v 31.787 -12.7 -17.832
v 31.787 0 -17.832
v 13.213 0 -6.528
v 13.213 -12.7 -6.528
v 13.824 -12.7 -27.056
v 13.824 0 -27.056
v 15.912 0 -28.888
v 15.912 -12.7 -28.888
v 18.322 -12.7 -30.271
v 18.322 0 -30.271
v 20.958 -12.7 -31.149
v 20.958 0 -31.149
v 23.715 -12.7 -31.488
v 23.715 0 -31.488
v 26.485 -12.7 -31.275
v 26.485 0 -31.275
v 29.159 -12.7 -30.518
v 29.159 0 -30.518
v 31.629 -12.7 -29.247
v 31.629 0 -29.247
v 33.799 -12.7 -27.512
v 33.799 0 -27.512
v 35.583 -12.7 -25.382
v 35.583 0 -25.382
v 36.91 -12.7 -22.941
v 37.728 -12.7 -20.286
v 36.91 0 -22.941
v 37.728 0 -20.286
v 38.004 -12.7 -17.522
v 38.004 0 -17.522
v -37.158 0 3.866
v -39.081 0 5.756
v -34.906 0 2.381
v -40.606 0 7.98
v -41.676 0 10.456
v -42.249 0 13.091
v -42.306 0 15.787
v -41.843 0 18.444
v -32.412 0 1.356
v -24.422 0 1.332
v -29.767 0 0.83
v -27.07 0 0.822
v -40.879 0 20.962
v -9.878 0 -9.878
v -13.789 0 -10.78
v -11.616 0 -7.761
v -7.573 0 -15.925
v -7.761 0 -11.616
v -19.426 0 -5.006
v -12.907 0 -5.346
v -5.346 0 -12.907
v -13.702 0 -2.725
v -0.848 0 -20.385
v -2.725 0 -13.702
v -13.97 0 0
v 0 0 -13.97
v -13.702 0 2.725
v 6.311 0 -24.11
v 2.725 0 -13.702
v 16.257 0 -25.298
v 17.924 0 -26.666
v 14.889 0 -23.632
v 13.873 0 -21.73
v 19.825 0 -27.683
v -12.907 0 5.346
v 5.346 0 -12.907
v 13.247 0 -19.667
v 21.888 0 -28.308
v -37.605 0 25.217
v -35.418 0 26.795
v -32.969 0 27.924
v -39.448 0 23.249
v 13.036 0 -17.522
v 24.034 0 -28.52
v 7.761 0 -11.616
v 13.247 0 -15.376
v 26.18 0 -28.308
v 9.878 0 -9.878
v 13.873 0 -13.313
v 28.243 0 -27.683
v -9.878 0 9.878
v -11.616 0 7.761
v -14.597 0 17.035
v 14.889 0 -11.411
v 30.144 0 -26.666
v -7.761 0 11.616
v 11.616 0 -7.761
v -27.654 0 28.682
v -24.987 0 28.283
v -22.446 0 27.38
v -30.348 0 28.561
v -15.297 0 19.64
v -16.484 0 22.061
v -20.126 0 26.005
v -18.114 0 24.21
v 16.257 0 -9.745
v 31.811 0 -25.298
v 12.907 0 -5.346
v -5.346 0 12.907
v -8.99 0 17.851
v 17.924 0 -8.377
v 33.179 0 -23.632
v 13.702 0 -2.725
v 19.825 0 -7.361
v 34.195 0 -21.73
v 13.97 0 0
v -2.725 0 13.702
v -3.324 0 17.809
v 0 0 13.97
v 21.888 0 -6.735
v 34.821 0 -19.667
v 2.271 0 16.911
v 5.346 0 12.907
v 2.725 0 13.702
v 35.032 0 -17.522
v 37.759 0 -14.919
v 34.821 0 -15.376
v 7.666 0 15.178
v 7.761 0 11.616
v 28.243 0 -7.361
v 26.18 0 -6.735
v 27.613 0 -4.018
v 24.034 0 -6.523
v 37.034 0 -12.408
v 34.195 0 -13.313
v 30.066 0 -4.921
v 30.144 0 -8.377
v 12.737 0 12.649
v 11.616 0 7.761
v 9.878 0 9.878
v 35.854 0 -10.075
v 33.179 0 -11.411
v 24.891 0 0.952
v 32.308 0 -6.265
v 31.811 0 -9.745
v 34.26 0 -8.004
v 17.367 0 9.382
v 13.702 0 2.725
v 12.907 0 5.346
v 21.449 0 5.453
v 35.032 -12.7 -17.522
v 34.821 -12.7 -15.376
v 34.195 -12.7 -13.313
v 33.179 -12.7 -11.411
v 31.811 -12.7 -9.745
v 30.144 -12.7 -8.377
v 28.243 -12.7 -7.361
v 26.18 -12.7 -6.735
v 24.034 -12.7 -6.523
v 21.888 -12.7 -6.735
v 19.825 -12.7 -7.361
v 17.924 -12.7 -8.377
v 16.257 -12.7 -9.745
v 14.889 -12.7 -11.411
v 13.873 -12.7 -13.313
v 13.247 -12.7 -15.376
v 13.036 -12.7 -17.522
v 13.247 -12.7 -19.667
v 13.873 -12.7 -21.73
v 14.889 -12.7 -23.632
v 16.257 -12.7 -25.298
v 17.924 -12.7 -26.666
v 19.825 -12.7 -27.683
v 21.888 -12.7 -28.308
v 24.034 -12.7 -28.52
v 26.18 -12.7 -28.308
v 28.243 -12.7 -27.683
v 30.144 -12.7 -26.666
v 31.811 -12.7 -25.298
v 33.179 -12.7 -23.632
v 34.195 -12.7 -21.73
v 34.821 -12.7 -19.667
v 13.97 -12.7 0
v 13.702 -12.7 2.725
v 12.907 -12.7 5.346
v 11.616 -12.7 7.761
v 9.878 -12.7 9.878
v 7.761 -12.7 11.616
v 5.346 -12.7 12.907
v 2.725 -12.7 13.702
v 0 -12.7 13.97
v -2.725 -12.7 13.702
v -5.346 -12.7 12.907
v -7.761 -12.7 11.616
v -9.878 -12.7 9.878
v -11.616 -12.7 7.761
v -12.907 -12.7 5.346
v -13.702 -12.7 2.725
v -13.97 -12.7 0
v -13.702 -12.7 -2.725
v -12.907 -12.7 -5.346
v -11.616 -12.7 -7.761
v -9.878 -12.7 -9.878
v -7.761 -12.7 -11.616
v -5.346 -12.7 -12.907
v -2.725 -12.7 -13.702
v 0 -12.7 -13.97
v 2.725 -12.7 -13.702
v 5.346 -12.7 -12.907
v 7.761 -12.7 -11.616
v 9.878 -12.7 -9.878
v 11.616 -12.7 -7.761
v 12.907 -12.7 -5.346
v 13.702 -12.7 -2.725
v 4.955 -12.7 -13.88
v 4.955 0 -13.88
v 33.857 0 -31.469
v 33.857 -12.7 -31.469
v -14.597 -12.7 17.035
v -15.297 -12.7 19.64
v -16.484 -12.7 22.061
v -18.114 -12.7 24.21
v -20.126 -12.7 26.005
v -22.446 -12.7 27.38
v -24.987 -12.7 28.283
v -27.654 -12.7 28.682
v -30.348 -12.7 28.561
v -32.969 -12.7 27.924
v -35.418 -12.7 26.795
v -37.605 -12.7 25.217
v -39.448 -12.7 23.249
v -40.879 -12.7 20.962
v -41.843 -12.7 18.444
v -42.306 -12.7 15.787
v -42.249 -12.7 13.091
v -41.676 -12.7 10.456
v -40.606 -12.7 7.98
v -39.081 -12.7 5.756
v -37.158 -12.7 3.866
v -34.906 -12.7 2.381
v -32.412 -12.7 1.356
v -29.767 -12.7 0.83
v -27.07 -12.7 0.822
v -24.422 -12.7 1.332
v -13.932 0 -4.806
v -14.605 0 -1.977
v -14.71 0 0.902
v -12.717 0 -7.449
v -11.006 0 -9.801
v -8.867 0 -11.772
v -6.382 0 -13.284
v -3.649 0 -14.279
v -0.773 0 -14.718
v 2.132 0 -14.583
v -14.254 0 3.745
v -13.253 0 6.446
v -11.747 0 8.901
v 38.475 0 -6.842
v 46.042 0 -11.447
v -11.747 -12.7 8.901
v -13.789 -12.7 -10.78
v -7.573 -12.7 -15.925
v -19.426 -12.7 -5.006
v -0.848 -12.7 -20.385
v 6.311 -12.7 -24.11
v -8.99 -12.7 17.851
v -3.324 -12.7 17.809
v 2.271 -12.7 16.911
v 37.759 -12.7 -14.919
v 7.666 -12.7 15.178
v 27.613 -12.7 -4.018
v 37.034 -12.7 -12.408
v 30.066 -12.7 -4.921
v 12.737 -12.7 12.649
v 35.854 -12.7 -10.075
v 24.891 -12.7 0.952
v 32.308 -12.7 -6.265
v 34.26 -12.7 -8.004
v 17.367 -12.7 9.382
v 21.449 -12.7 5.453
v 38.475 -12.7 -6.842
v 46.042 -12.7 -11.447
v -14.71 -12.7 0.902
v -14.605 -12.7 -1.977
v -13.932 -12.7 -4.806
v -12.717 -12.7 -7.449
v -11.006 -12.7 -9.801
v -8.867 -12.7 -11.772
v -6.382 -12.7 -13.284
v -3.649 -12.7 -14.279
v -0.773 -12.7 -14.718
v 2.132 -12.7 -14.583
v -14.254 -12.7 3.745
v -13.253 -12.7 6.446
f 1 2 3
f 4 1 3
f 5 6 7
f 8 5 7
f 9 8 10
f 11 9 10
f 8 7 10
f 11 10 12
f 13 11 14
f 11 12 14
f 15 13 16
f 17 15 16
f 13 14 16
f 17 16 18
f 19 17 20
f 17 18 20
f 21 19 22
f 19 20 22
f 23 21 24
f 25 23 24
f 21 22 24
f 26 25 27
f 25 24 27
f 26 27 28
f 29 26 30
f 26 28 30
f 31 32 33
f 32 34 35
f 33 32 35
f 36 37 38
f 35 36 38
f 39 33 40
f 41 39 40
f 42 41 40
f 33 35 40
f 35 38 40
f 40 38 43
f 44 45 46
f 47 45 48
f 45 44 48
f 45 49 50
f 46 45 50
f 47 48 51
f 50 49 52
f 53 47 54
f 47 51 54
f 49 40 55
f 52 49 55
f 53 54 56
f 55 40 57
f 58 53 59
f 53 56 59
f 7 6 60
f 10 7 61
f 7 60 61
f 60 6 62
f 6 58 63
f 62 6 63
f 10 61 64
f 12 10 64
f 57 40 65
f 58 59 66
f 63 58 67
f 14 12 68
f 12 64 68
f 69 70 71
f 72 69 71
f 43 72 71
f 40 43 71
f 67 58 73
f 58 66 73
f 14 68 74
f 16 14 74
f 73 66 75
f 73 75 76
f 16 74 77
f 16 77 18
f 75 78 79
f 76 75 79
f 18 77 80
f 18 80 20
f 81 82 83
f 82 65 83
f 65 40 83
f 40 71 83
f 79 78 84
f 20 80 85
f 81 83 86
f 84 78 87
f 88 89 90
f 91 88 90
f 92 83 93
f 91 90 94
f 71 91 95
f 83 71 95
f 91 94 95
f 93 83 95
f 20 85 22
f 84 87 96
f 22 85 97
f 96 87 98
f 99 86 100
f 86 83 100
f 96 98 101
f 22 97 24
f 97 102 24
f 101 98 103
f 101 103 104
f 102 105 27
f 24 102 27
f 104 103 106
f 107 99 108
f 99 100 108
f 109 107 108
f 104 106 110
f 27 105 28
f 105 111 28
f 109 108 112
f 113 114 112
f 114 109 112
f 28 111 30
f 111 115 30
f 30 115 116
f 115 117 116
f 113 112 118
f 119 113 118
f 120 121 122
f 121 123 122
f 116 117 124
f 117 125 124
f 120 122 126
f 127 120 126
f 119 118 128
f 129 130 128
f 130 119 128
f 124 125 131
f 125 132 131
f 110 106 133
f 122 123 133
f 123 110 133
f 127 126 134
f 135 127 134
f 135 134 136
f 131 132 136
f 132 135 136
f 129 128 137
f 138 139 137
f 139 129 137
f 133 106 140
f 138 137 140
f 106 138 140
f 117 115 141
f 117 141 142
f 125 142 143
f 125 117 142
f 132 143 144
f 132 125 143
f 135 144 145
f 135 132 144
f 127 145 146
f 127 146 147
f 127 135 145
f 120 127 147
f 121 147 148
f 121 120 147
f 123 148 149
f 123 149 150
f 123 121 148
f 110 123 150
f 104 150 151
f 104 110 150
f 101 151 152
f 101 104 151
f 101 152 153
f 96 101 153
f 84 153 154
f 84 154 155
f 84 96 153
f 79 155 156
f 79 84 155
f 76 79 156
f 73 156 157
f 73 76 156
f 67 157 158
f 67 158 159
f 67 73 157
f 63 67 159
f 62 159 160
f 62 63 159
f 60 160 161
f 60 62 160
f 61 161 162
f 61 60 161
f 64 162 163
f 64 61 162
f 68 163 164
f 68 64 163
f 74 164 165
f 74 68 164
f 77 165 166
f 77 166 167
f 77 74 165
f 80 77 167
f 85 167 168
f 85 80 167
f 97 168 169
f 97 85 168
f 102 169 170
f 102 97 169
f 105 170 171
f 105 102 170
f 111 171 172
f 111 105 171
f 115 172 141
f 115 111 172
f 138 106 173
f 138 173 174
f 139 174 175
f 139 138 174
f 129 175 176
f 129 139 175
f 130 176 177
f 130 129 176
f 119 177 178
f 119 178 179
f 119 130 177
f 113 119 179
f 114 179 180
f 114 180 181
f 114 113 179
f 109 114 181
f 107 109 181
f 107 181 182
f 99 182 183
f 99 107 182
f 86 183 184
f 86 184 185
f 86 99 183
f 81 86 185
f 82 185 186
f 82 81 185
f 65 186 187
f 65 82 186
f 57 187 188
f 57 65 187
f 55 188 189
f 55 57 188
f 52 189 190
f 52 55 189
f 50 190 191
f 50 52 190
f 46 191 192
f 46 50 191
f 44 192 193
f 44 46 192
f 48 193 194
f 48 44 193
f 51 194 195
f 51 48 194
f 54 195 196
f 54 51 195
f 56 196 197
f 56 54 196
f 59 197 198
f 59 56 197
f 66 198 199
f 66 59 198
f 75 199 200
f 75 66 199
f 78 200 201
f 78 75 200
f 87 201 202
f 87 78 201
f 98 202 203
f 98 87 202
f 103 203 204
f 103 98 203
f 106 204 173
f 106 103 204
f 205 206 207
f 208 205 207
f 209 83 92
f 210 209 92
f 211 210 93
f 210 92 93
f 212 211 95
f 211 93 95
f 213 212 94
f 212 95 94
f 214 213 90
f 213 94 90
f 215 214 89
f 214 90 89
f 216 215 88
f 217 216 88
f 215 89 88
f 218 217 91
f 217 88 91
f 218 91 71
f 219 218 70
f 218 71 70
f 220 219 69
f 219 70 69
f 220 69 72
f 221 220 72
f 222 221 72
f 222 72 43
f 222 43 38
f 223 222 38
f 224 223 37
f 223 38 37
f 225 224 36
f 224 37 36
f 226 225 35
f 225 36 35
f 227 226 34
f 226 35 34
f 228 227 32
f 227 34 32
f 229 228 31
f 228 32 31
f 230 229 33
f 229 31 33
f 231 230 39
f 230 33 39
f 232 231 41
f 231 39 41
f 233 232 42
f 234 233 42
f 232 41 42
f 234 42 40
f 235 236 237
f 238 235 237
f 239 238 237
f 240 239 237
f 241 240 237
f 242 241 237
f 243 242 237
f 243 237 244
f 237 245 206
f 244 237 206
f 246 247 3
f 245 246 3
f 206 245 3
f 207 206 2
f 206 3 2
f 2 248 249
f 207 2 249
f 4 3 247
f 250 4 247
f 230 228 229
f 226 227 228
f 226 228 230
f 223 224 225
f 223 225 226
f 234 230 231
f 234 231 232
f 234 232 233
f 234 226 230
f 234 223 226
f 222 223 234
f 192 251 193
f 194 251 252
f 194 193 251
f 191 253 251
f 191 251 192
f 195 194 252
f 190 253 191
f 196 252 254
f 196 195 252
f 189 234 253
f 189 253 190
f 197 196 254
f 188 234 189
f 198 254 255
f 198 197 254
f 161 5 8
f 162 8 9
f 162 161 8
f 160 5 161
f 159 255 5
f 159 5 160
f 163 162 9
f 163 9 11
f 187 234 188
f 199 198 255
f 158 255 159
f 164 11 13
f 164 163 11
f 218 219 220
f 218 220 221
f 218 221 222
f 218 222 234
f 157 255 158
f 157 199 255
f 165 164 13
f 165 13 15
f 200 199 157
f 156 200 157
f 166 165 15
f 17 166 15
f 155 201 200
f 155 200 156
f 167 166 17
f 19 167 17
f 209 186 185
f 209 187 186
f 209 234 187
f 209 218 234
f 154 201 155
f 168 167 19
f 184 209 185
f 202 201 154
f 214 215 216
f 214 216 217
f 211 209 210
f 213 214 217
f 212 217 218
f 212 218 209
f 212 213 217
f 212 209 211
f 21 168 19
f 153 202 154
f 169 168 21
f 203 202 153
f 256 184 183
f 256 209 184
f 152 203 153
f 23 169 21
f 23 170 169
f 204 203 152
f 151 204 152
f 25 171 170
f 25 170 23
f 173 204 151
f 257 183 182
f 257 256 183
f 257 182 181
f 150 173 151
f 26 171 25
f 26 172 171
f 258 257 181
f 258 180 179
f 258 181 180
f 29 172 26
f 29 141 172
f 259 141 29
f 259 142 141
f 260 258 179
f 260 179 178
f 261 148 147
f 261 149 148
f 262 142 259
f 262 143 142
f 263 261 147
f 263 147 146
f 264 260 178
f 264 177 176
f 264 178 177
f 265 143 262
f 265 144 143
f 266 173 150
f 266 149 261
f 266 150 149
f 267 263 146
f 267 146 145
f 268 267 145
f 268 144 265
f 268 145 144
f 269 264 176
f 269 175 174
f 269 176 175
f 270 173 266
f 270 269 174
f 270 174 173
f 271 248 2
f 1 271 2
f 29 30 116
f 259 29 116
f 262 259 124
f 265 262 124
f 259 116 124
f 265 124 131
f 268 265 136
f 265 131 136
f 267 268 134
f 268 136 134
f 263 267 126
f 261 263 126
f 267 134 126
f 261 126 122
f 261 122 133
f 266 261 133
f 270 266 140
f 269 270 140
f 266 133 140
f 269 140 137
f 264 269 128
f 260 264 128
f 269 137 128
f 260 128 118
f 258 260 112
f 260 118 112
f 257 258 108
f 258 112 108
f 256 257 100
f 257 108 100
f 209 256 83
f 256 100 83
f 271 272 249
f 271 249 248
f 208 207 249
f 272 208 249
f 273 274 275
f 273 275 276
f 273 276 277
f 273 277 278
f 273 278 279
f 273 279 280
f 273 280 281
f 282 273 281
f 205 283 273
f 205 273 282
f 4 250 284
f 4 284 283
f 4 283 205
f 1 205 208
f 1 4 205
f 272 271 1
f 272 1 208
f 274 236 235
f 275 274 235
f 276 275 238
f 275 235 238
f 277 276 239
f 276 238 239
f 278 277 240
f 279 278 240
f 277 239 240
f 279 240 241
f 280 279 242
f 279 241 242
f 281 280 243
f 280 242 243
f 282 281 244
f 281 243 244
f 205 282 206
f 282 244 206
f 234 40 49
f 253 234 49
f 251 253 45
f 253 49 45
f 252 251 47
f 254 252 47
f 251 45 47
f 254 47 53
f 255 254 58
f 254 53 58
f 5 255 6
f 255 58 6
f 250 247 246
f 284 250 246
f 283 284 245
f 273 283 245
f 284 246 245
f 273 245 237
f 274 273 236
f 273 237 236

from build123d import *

# Parameters (mm, degrees)
F2_DEPTH = 12.7
F1_R     = 13.97
F1_R_2   = 10.9982


with BuildPart() as f2:
    # F0 (on Front) → F2 (new body)
    with BuildSketch(Plane.XZ):
        with BuildLine():
            ThreePointArc((-14.6047199117, -1.976578188), (-7.6618700473, -12.5896962795), (4.9546424123, -13.8800656914))
            Line((4.9546424123, -13.8800656914), (-14.6047199117, -1.976578188))
        make_face()
        with BuildLine():
            ThreePointArc((13.2132206337, -6.528055263), (9.7995319403, -11.0079007437), (4.9546424123, -13.8800656914))
            Line((4.9546424123, -13.8800656914), (33.856634211, -31.469314896))
            Line((33.856634211, -31.469314896), (46.0419560348, -11.446853032))
            Line((46.0419560348, -11.446853032), (38.475157361, -6.84183105))
            Line((38.475157361, -6.84183105), (31.7869223654, -17.8316868842))
            Line((31.7869223654, -17.8316868842), (13.2132206337, -6.528055263))
        make_face()
        with BuildLine():
            Line((-14.6047199117, -1.976578188), (4.9546424123, -13.8800656914))
            ThreePointArc((4.9546424123, -13.8800656914), (9.7995319403, -11.0079007437), (13.2132206337, -6.528055263))
            Line((13.2132206337, -6.528055263), (-11.7466976447, 8.9005505154))
            ThreePointArc((-11.7466976447, 8.9005505154), (-14.2540269403, 3.7453198819), (-14.6047199117, -1.976578188))
        make_face()
    extrude(amount=F2_DEPTH)


with BuildPart() as f2b:
    # F1 (on Front) → F2, piece 2 (new body)
    with BuildSketch(Plane.XZ):
        with BuildLine():
            ThreePointArc((-14.5970417573, 17.0351092838), (-14.4535730538, 15.8867835628), (-14.4056405115, 14.7305233404))
            ThreePointArc((-14.4056405115, 14.7305233404), (-17.1865077148, 6.3660623741), (-24.4219908705, 1.3316594141))
            ThreePointArc((-24.4219908705, 1.3316594141), (-7.5727892853, -15.9254305951), (13.8236626529, -27.05622545))
            ThreePointArc((13.8236626529, -27.05622545), (12.0471391185, -10.3469074291), (27.6131346419, -4.0178373585))
            ThreePointArc((27.6131346419, -4.0178373585), (10.2493114705, 14.0096979032), (-14.5970417573, 17.0351092838))
        make_face()
        Circle(F1_R, mode=Mode.SUBTRACT)
        with BuildLine():
            ThreePointArc((38.004012109, -17.5215695053), (35.1056254012, -9.0021634751), (27.6131346419, -4.0178373585))
            ThreePointArc((27.6131346419, -4.0178373585), (12.0471391185, -10.3469074291), (13.8236626529, -27.05622545))
            ThreePointArc((13.8236626529, -27.05622545), (29.158576388, -30.517712816), (38.004012109, -17.5215695053))
        make_face()
        with Locations((24.034012109, -17.5215695053)):
            Circle(F1_R_2, mode=Mode.SUBTRACT)
        with BuildLine():
            ThreePointArc((-24.4219908705, 1.3316594141), (-17.1865077148, 6.3660623741), (-14.4056405115, 14.7305233404))
            ThreePointArc((-14.4056405115, 14.7305233404), (-14.4535730538, 15.8867835628), (-14.5970417573, 17.0351092838))
            ThreePointArc((-14.5970417573, 17.0351092838), (-40.2186866881, 22.1401898147), (-24.4219908705, 1.3316594141))
        make_face()
        with Locations((-28.3756405115, 14.7305233404)):
            Circle(F1_R_2, mode=Mode.SUBTRACT)
        with Locations((-28.3756405115, 14.7305233404)):
            Circle(F1_R_2)
    extrude(amount=F2_DEPTH)


solid = Compound([f2.part, f2b.part])
